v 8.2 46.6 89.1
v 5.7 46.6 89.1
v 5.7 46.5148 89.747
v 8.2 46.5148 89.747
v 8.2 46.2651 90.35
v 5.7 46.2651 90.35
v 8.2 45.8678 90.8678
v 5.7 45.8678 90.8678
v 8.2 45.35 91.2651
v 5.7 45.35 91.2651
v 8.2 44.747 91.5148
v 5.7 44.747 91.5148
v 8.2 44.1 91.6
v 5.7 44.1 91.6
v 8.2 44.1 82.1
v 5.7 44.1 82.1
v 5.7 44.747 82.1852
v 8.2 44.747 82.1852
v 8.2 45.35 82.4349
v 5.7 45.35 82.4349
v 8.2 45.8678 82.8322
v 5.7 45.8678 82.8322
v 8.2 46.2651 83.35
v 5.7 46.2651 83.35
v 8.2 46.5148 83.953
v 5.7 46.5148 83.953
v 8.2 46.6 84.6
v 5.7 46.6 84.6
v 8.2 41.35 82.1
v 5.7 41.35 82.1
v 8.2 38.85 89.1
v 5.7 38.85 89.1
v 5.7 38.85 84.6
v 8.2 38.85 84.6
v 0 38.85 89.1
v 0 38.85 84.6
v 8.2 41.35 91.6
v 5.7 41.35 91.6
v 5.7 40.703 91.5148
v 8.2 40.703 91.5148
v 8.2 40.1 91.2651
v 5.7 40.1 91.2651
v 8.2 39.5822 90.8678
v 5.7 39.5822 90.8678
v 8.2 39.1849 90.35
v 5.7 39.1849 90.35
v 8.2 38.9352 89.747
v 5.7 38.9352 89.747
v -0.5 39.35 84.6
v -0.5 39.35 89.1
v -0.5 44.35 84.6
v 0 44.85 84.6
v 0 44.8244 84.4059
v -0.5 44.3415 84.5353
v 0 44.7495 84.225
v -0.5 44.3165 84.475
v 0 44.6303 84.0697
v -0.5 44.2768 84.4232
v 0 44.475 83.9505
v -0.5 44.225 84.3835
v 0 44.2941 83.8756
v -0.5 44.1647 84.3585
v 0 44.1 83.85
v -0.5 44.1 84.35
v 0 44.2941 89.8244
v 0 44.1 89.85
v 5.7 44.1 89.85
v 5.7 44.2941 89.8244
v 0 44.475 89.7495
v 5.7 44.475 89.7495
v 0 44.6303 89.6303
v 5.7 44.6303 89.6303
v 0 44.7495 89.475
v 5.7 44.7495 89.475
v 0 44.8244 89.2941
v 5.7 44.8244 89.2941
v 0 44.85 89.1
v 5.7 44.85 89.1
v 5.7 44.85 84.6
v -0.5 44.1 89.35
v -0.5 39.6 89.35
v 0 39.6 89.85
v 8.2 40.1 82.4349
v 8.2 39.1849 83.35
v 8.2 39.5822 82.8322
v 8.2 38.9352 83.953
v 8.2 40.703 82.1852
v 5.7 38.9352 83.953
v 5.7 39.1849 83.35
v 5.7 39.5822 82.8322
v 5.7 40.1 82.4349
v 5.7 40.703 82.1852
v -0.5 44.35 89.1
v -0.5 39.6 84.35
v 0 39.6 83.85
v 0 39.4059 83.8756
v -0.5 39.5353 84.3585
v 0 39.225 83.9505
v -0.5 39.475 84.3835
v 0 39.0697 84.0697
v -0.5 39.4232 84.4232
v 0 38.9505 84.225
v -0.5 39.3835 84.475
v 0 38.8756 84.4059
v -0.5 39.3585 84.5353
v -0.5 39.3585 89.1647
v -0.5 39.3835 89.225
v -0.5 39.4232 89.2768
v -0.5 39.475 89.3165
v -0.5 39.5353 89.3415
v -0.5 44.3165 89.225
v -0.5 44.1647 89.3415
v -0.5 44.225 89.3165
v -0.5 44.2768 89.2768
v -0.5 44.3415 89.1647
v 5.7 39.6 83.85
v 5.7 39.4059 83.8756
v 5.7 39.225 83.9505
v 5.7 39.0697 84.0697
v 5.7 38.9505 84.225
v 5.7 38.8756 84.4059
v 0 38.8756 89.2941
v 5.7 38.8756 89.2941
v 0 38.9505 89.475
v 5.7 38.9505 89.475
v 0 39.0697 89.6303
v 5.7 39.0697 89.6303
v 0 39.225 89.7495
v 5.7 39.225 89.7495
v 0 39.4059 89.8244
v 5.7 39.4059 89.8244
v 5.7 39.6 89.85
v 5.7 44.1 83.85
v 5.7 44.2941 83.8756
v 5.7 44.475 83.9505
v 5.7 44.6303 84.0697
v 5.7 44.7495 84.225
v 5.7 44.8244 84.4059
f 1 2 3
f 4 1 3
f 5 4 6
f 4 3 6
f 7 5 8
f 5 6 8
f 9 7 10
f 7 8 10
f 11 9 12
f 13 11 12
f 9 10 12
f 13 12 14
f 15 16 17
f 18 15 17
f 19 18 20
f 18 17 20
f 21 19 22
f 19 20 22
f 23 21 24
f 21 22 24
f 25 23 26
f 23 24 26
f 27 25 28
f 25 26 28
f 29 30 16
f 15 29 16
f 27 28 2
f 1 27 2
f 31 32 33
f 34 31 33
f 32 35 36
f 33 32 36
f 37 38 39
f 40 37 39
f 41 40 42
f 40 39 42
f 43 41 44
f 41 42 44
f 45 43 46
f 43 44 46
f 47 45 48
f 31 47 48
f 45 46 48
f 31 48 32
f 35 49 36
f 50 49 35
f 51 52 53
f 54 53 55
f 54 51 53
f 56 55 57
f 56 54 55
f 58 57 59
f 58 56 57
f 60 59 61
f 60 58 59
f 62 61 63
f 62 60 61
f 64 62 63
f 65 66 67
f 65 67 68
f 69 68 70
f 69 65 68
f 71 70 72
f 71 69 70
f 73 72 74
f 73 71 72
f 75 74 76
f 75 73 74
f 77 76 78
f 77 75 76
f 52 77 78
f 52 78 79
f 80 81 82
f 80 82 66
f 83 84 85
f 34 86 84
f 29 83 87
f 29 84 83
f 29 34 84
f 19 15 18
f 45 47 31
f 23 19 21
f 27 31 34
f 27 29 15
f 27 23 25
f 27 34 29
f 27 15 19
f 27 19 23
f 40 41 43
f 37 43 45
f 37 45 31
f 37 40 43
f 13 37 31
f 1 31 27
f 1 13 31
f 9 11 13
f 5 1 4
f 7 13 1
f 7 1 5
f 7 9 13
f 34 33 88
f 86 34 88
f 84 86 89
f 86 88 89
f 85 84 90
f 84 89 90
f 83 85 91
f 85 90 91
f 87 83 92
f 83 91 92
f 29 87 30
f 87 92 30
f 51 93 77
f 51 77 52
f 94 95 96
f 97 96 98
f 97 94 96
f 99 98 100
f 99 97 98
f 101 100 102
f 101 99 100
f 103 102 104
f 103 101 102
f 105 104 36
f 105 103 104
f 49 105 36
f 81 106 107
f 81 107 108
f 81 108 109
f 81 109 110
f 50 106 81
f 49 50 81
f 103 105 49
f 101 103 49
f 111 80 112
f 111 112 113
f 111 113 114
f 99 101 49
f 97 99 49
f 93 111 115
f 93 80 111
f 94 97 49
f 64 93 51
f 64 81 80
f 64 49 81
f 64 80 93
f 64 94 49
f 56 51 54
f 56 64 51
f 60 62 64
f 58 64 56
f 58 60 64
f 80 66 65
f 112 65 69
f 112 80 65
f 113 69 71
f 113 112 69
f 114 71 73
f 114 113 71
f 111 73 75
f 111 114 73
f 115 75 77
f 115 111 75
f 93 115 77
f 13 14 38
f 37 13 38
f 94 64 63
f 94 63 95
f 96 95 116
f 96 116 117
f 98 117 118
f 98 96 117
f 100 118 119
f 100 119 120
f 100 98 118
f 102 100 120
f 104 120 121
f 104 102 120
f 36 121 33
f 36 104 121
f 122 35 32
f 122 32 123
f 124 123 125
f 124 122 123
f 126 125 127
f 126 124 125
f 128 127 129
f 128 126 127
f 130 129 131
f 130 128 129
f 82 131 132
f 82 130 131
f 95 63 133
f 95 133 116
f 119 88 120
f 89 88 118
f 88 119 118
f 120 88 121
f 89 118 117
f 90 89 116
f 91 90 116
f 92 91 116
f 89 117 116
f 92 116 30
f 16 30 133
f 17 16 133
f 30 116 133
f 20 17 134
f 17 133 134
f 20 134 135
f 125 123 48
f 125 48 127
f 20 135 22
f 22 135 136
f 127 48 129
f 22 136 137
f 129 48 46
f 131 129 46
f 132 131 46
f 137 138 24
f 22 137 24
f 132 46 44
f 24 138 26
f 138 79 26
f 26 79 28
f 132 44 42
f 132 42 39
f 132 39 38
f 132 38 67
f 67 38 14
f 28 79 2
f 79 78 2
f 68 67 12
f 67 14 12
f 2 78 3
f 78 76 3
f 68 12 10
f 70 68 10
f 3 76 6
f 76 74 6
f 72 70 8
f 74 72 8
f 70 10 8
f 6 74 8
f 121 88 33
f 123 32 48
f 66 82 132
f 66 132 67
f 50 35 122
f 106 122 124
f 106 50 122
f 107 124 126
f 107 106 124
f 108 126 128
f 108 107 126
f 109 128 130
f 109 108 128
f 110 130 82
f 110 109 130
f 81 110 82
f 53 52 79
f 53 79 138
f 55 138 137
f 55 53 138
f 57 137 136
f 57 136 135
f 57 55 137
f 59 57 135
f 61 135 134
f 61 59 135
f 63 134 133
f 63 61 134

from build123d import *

# Parameters (mm, degrees)
PAD013_DEPTH = 5.7
PAD014_DEPTH = 2.5
PAD015_DEPTH = 0.5
PAD015_TAPER = 45


with BuildPart() as part:
    # Sketch028 (on Face271 of Binder002) → Pad013 (new body)
    with BuildSketch(Plane(origin=(0, 0, 0), x_dir=(0, -1, 0), z_dir=(-1, 0, 0))):
        with BuildLine():
            Line((-44.85, 89.1), (-44.85, 84.6))
            ThreePointArc((-44.85, 84.6), (-44.63033, 84.06967), (-44.1, 83.85))
            Line((-44.1, 83.85), (-39.6, 83.85))
            ThreePointArc((-39.6, 83.85), (-39.06967, 84.06967), (-38.85, 84.6))
            Line((-38.85, 84.6), (-38.85, 89.1))
            ThreePointArc((-38.85, 89.1), (-39.06967, 89.63033), (-39.6, 89.85))
            Line((-39.6, 89.85), (-44.1, 89.85))
            ThreePointArc((-44.1, 89.85), (-44.63033, 89.63033), (-44.85, 89.1))
        make_face()
    extrude(amount=-PAD013_DEPTH)

    # Sketch029 (on Face4 of Pad013) → Pad014 (join)
    with BuildSketch(Plane.YZ.offset(5.7)):
        with BuildLine():
            Line((38.85, 89.1), (38.85, 84.6))
            ThreePointArc((38.85, 84.6), (39.582233, 82.832233), (41.35, 82.1))
            Line((41.35, 82.1), (44.1, 82.1))
            ThreePointArc((44.1, 82.1), (45.867767, 82.832233), (46.6, 84.6))
            Line((46.6, 84.6), (46.6, 89.1))
            ThreePointArc((46.6, 89.1), (45.867767, 90.867767), (44.1, 91.6))
            Line((44.1, 91.6), (41.35, 91.6))
            ThreePointArc((41.35, 91.6), (39.582233, 90.867767), (38.85, 89.1))
        make_face()
    extrude(amount=PAD014_DEPTH)

    # Sketch028 (on Face271 of Binder002) → Pad015 (join)
    with BuildSketch(Plane(origin=(0, 0, 0), x_dir=(0, -1, 0), z_dir=(-1, 0, 0))):
        with BuildLine():
            Line((-44.85, 89.1), (-44.85, 84.6))
            ThreePointArc((-44.85, 84.6), (-44.63033, 84.06967), (-44.1, 83.85))
            Line((-44.1, 83.85), (-39.6, 83.85))
            ThreePointArc((-39.6, 83.85), (-39.06967, 84.06967), (-38.85, 84.6))
            Line((-38.85, 84.6), (-38.85, 89.1))
            ThreePointArc((-38.85, 89.1), (-39.06967, 89.63033), (-39.6, 89.85))
            Line((-39.6, 89.85), (-44.1, 89.85))
            ThreePointArc((-44.1, 89.85), (-44.63033, 89.63033), (-44.85, 89.1))
        make_face()
    extrude(amount=PAD015_DEPTH, taper=PAD015_TAPER)


solid = part.part
